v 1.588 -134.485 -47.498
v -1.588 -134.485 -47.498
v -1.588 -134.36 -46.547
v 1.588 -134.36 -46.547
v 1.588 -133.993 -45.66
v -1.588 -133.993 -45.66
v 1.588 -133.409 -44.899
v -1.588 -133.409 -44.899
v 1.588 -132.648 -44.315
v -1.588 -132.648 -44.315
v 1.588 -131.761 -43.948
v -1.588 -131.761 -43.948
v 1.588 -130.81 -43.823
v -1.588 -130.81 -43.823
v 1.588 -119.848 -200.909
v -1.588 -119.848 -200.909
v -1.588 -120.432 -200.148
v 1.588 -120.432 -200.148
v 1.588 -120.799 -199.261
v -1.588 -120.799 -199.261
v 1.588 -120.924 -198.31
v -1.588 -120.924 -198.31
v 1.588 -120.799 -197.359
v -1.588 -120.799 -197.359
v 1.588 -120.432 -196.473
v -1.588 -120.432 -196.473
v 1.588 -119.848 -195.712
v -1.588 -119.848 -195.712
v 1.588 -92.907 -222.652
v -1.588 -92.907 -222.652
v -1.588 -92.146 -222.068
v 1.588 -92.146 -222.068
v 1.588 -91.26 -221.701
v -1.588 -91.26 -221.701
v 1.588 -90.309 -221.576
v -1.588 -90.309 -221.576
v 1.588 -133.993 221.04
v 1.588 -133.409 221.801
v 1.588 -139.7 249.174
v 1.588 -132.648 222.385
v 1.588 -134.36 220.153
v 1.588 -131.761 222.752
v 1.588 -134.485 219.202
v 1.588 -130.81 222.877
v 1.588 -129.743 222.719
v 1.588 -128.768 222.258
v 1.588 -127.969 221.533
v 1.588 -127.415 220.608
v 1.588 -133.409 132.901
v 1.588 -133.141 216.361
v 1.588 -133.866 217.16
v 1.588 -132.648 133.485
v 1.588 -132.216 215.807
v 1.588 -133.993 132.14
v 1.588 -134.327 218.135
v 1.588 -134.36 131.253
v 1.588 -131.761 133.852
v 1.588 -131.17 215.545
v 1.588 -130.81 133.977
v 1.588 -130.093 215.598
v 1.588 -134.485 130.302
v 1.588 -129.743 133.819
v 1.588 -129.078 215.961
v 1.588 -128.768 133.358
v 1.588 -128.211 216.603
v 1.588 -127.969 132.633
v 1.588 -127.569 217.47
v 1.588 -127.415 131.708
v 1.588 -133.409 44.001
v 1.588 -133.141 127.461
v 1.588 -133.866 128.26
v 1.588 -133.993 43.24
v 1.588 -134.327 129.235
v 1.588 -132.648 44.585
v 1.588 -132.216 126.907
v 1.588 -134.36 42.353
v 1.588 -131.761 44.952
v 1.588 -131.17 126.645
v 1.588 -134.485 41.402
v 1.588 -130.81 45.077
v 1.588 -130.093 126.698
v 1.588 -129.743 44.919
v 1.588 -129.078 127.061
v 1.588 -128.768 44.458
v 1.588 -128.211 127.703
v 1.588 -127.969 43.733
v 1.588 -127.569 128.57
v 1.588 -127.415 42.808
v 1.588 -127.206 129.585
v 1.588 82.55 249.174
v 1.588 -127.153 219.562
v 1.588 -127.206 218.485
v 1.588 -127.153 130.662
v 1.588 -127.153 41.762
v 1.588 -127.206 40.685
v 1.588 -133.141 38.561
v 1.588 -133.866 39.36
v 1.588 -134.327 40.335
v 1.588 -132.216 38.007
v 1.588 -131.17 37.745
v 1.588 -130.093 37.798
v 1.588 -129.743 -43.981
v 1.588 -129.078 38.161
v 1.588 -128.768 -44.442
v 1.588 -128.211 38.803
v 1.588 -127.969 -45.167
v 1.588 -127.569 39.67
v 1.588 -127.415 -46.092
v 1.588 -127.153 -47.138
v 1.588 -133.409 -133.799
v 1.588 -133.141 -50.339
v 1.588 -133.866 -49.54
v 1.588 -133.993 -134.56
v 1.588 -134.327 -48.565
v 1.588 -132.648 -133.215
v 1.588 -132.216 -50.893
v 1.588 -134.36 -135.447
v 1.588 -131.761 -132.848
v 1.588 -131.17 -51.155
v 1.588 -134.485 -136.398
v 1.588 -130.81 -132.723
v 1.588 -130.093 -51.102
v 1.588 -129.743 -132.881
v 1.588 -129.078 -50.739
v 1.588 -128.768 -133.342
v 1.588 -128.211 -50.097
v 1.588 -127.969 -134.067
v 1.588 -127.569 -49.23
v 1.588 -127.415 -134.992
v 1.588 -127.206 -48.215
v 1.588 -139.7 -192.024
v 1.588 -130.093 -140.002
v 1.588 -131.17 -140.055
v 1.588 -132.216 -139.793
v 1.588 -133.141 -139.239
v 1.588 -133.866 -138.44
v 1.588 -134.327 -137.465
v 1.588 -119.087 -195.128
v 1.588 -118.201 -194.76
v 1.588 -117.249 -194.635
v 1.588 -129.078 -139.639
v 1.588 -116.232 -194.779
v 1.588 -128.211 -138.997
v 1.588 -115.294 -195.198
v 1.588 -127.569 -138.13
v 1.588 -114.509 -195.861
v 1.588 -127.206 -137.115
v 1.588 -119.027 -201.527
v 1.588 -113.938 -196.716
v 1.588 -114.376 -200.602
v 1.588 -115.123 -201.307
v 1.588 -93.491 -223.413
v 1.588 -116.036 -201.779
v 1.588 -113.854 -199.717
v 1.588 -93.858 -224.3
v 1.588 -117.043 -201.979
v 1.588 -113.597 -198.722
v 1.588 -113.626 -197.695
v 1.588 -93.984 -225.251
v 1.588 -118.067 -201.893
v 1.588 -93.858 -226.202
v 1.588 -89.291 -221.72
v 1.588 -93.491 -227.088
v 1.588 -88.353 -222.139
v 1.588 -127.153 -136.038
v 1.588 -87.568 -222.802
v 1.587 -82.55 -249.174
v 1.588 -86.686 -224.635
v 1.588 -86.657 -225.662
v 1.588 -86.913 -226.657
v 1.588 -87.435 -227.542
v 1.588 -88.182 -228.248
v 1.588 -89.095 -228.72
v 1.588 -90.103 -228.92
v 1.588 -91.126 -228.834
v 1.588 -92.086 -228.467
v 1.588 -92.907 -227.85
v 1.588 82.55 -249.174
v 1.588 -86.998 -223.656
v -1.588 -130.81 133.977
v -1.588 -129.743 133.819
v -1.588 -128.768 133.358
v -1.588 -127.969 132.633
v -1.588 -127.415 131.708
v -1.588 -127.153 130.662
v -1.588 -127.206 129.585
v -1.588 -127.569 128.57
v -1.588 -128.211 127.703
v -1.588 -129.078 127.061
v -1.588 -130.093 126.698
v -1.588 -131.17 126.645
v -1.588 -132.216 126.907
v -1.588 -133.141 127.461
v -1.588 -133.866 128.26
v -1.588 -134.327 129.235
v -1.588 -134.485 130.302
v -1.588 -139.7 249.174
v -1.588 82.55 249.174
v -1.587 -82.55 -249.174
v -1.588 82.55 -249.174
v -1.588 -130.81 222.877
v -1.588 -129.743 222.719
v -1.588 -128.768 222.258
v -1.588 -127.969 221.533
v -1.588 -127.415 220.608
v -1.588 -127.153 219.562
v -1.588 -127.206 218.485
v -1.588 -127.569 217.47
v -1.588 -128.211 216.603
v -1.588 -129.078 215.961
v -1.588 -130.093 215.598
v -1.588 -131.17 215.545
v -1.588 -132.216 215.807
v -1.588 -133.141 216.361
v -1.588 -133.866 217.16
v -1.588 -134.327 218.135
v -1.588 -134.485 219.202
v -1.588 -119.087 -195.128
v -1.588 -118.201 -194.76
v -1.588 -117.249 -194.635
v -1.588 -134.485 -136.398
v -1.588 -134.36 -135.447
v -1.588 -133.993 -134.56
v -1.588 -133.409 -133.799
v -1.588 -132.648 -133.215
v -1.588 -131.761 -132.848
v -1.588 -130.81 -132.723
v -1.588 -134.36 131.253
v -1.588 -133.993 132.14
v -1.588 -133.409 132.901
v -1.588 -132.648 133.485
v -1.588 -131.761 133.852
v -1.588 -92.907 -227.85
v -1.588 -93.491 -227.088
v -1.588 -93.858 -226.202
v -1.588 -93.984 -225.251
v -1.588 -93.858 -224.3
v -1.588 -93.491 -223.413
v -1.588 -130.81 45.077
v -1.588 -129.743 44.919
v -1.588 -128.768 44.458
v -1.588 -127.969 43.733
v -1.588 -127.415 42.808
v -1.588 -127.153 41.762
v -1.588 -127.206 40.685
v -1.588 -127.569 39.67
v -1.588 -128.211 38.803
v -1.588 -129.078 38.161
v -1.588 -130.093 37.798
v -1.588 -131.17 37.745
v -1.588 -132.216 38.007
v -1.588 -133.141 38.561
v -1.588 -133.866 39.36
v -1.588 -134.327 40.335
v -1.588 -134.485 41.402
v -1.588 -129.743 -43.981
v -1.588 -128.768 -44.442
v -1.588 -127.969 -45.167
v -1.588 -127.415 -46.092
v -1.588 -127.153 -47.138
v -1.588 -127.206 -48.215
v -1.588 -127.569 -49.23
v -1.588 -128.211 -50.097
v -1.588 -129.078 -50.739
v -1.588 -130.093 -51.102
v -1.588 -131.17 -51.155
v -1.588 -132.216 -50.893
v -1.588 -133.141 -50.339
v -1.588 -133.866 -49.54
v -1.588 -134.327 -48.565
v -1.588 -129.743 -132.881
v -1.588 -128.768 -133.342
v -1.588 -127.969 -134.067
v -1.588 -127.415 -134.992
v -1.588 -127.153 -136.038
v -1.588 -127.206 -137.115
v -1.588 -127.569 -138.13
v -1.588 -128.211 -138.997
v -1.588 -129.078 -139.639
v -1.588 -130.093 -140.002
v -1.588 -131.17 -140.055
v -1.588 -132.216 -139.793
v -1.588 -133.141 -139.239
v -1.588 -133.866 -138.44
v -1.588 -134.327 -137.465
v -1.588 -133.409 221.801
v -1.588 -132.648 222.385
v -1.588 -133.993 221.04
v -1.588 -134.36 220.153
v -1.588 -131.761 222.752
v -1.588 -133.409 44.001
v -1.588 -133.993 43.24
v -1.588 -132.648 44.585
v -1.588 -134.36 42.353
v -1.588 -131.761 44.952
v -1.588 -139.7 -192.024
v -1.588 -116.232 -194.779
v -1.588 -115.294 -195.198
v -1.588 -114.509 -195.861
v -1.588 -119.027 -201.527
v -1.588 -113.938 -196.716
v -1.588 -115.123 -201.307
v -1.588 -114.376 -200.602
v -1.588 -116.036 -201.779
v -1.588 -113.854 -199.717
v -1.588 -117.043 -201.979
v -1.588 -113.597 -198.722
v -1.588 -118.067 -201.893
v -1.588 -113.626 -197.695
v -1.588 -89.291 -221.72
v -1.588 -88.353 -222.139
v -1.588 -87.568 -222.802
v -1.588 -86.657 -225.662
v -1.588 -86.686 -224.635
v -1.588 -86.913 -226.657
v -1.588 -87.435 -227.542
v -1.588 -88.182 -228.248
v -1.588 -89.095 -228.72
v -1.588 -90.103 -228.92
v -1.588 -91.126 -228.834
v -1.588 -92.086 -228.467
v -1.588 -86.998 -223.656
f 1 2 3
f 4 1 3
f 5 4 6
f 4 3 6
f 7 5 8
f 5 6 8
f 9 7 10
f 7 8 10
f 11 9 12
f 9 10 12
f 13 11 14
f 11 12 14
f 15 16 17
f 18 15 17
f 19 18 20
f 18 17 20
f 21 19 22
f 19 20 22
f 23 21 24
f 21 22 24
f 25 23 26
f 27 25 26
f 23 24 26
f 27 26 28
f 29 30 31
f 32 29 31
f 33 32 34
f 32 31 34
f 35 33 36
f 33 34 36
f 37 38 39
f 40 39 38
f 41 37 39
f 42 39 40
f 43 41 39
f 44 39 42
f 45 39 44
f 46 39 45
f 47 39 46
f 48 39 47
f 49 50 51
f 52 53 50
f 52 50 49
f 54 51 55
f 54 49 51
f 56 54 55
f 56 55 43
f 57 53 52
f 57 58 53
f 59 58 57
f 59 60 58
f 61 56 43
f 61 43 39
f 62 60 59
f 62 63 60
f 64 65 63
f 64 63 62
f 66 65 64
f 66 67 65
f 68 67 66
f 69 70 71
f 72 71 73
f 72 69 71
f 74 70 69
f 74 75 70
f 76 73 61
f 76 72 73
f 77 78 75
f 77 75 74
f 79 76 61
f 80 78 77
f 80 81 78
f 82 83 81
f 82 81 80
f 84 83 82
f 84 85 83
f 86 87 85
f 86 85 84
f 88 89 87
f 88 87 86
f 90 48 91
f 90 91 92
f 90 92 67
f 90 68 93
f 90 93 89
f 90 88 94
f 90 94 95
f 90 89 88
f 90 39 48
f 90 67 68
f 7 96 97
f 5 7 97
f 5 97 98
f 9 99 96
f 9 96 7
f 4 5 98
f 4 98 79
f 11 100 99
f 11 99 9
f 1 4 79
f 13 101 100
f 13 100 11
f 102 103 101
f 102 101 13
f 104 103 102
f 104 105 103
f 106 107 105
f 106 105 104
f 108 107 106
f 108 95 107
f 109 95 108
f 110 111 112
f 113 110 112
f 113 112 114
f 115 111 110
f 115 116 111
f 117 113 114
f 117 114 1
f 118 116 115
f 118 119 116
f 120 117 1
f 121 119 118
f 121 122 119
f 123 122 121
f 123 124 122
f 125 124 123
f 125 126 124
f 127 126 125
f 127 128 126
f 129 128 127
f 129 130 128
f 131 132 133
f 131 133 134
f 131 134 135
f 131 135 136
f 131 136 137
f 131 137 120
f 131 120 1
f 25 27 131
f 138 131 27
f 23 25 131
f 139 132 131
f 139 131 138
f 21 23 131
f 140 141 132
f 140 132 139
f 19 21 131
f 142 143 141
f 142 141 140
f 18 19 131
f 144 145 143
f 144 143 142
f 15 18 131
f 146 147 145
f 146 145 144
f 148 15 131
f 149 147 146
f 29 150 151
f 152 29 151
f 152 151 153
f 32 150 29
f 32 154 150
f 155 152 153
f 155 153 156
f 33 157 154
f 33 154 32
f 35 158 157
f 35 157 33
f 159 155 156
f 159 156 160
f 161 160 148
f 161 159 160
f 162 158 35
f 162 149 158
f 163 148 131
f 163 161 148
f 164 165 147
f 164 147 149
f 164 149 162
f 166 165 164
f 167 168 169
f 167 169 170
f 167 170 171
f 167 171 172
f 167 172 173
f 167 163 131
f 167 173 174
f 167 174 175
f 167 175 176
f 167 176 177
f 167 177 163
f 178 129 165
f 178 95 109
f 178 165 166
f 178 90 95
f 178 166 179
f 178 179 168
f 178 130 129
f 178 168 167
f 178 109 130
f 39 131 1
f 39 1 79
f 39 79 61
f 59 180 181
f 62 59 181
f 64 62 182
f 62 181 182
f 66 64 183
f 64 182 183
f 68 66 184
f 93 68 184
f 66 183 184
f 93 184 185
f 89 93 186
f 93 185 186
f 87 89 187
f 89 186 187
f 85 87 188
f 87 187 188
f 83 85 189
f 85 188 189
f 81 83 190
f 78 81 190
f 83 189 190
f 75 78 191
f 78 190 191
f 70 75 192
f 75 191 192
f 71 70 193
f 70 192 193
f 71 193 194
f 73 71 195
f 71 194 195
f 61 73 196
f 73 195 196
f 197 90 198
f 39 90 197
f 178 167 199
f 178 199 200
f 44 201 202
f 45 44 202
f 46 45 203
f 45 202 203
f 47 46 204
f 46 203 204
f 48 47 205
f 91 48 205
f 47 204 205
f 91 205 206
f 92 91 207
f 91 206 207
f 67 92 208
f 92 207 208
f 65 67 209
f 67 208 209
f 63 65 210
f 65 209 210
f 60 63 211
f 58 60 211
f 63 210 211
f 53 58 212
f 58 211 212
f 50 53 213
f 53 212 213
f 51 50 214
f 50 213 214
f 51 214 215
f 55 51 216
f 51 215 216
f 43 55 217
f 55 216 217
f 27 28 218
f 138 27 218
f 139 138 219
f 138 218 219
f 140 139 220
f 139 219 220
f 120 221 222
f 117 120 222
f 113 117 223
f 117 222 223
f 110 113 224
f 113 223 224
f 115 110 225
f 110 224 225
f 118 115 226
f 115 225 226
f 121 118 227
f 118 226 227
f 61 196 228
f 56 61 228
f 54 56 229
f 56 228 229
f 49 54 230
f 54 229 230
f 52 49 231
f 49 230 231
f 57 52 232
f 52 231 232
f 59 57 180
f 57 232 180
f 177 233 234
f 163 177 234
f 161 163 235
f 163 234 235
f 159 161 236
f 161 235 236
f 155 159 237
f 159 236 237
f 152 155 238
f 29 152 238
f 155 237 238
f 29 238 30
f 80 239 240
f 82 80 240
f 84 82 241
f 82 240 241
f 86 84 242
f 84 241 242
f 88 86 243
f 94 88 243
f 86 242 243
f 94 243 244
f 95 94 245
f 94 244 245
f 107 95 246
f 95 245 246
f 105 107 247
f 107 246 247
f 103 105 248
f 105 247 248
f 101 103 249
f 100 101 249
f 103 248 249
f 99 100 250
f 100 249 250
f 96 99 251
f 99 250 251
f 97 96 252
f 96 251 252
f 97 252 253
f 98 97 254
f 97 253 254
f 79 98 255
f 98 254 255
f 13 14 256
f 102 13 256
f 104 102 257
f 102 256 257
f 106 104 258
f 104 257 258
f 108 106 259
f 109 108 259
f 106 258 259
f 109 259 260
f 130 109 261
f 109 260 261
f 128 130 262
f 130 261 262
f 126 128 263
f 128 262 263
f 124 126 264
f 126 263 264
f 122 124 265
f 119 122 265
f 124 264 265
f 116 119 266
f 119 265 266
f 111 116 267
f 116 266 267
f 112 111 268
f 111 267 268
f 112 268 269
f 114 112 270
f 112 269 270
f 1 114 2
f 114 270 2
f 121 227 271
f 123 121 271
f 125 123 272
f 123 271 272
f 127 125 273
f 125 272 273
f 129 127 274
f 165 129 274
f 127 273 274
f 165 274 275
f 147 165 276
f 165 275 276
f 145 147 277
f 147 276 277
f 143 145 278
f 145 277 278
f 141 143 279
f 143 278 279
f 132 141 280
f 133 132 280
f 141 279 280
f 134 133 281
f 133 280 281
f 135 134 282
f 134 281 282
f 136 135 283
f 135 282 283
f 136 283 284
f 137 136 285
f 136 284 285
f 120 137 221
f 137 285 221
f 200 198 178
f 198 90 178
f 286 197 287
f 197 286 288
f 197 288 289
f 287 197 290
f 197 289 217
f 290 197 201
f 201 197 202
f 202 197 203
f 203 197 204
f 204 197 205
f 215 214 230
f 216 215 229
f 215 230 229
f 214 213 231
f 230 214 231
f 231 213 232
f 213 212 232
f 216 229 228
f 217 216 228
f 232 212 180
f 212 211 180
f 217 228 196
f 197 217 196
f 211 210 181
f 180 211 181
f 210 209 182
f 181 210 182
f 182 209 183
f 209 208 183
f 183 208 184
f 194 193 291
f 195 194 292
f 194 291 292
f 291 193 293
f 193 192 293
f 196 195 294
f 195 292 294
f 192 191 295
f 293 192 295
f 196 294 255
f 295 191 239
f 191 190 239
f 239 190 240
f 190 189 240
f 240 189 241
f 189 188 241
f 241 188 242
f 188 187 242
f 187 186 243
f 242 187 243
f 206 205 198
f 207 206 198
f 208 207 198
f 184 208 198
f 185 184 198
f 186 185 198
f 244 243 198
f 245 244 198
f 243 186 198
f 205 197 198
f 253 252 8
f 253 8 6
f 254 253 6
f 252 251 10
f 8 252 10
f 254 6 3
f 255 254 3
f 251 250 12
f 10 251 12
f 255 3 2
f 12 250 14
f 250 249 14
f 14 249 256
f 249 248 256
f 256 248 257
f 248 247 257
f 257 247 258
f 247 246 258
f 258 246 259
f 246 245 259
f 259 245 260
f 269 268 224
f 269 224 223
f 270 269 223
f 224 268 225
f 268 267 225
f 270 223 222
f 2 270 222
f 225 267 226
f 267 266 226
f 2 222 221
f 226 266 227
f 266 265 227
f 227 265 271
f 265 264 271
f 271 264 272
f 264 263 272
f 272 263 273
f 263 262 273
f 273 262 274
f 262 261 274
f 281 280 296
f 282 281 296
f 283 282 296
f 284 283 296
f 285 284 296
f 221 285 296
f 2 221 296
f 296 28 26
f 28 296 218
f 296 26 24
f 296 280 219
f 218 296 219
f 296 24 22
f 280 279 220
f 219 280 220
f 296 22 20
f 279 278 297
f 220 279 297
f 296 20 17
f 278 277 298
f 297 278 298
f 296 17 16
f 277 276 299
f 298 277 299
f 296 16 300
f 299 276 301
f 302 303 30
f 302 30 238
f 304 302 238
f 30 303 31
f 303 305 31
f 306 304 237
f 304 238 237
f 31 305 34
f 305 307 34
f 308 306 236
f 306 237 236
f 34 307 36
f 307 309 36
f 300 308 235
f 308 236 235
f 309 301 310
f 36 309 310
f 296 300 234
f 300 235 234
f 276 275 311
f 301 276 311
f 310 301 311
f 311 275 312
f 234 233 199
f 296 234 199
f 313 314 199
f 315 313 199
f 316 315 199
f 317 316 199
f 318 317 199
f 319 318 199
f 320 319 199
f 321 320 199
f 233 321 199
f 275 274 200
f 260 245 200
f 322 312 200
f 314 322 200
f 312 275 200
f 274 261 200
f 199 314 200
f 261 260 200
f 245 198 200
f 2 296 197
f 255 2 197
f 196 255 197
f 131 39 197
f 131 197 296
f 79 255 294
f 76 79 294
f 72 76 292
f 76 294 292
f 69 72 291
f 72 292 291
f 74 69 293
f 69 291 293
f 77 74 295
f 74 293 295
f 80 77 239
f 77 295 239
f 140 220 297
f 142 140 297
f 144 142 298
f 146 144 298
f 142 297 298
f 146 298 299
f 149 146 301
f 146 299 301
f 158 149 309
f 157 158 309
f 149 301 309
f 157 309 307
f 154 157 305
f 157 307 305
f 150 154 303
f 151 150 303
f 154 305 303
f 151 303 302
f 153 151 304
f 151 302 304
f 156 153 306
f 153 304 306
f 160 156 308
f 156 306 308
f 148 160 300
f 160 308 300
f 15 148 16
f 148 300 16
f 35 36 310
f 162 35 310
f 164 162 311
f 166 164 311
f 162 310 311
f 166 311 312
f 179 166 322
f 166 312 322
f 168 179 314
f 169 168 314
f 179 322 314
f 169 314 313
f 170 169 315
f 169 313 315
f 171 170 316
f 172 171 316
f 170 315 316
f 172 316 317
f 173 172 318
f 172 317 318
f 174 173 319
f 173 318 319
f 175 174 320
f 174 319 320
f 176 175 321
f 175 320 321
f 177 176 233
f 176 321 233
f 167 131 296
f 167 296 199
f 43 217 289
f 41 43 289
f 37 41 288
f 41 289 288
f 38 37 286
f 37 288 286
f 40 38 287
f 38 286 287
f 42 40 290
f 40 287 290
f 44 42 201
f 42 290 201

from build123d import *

# Parameters (mm, degrees)
SKETCH1_W           = 498.348
SKETCH1_H           = 165.1
BOSS_EXTRUDE1_DEPTH = 1.5875
BOSS_EXTRUDE2_DEPTH = 3.175
CUT_EXTRUDE1_DEPTH  = 286.681383539
LPATTERN1_COUNT     = 5
LPATTERN1_PITCH     = 88.9
CUT_EXTRUDE2_DEPTH  = 286.681383539
LPATTERN2_COUNT     = 2
LPATTERN2_PITCH     = 38.1


with BuildPart() as part:
    # Sketch1 → Boss-Extrude1 (new, symmetric)
    with BuildSketch(Plane(origin=(0, 0, 0), x_dir=(0, 0, -1), z_dir=(1, 0, 0))):
        Rectangle(SKETCH1_W, SKETCH1_H)
    extrude(amount=BOSS_EXTRUDE1_DEPTH, both=True)

    # Sketch2 → Boss-Extrude2 (add)
    with BuildSketch(Plane(origin=(1.5875, 0, 0), x_dir=(0, 0, -1), z_dir=(1, 0, 0))):
        Polygon((192.024, -139.7), (249.174, -82.55), (-249.174, -82.55), (-249.174, -139.7), align=None)
    extrude(amount=-BOSS_EXTRUDE2_DEPTH)

    # Sketch3 → Cut-Extrude1 (cut, through all)
    with BuildSketch(Plane.ZY.offset(1.5875)):
        with BuildLine():
            ThreePointArc((222.877, -130.81), (216.603382579, -128.211382579), (219.202, -134.485))
            Line((219.202, -134.485), (219.202, -130.81))
            Line((219.202, -130.81), (222.877, -130.81))
        make_face()
        with BuildLine():
            Line((219.202, -130.81), (219.202, -134.485))
            ThreePointArc((219.202, -134.485), (221.800617421, -133.408617421), (222.877, -130.81))
            Line((222.877, -130.81), (219.202, -130.81))
        make_face()
    cut_extrude1 = extrude(amount=-CUT_EXTRUDE1_DEPTH, mode=Mode.SUBTRACT)

    # LPattern1: Cut-Extrude1 ×5
    with Locations(*[(0, 0, -i * LPATTERN1_PITCH) for i in range(1, LPATTERN1_COUNT)]):
        add(cut_extrude1, mode=Mode.SUBTRACT)

    # Sketch4 → Cut-Extrude2 (cut, symmetric)
    with BuildSketch(Plane.ZY.offset(1.5875)):
        with BuildLine():
            ThreePointArc((-194.635179285, -117.249359697), (-199.716540899, -113.854102415), (-200.908796706, -119.847977118))
            Line((-200.908796706, -119.847977118), (-198.310179285, -117.249359697))
            Line((-198.310179285, -117.249359697), (-195.711561864, -119.847977118))
            ThreePointArc((-195.711561864, -119.847977118), (-194.914922003, -118.655721311), (-194.635179285, -117.249359697))
        make_face()
        with BuildLine():
            Line((-198.310179285, -117.249359697), (-200.908796706, -119.847977118))
            ThreePointArc((-200.908796706, -119.847977118), (-198.310179285, -120.924359697), (-195.711561864, -119.847977118))
            Line((-195.711561864, -119.847977118), (-198.310179285, -117.249359697))
        make_face()
    cut_extrude2 = extrude(amount=CUT_EXTRUDE2_DEPTH, both=True, mode=Mode.SUBTRACT)

    # LPattern2: Cut-Extrude2 ×2
    with Locations(*[Vector(0, 0.7071067811865446, -0.7071067811865507) * (i * LPATTERN2_PITCH) for i in range(1, LPATTERN2_COUNT)]):
        add(cut_extrude2, mode=Mode.SUBTRACT)


solid = part.part
